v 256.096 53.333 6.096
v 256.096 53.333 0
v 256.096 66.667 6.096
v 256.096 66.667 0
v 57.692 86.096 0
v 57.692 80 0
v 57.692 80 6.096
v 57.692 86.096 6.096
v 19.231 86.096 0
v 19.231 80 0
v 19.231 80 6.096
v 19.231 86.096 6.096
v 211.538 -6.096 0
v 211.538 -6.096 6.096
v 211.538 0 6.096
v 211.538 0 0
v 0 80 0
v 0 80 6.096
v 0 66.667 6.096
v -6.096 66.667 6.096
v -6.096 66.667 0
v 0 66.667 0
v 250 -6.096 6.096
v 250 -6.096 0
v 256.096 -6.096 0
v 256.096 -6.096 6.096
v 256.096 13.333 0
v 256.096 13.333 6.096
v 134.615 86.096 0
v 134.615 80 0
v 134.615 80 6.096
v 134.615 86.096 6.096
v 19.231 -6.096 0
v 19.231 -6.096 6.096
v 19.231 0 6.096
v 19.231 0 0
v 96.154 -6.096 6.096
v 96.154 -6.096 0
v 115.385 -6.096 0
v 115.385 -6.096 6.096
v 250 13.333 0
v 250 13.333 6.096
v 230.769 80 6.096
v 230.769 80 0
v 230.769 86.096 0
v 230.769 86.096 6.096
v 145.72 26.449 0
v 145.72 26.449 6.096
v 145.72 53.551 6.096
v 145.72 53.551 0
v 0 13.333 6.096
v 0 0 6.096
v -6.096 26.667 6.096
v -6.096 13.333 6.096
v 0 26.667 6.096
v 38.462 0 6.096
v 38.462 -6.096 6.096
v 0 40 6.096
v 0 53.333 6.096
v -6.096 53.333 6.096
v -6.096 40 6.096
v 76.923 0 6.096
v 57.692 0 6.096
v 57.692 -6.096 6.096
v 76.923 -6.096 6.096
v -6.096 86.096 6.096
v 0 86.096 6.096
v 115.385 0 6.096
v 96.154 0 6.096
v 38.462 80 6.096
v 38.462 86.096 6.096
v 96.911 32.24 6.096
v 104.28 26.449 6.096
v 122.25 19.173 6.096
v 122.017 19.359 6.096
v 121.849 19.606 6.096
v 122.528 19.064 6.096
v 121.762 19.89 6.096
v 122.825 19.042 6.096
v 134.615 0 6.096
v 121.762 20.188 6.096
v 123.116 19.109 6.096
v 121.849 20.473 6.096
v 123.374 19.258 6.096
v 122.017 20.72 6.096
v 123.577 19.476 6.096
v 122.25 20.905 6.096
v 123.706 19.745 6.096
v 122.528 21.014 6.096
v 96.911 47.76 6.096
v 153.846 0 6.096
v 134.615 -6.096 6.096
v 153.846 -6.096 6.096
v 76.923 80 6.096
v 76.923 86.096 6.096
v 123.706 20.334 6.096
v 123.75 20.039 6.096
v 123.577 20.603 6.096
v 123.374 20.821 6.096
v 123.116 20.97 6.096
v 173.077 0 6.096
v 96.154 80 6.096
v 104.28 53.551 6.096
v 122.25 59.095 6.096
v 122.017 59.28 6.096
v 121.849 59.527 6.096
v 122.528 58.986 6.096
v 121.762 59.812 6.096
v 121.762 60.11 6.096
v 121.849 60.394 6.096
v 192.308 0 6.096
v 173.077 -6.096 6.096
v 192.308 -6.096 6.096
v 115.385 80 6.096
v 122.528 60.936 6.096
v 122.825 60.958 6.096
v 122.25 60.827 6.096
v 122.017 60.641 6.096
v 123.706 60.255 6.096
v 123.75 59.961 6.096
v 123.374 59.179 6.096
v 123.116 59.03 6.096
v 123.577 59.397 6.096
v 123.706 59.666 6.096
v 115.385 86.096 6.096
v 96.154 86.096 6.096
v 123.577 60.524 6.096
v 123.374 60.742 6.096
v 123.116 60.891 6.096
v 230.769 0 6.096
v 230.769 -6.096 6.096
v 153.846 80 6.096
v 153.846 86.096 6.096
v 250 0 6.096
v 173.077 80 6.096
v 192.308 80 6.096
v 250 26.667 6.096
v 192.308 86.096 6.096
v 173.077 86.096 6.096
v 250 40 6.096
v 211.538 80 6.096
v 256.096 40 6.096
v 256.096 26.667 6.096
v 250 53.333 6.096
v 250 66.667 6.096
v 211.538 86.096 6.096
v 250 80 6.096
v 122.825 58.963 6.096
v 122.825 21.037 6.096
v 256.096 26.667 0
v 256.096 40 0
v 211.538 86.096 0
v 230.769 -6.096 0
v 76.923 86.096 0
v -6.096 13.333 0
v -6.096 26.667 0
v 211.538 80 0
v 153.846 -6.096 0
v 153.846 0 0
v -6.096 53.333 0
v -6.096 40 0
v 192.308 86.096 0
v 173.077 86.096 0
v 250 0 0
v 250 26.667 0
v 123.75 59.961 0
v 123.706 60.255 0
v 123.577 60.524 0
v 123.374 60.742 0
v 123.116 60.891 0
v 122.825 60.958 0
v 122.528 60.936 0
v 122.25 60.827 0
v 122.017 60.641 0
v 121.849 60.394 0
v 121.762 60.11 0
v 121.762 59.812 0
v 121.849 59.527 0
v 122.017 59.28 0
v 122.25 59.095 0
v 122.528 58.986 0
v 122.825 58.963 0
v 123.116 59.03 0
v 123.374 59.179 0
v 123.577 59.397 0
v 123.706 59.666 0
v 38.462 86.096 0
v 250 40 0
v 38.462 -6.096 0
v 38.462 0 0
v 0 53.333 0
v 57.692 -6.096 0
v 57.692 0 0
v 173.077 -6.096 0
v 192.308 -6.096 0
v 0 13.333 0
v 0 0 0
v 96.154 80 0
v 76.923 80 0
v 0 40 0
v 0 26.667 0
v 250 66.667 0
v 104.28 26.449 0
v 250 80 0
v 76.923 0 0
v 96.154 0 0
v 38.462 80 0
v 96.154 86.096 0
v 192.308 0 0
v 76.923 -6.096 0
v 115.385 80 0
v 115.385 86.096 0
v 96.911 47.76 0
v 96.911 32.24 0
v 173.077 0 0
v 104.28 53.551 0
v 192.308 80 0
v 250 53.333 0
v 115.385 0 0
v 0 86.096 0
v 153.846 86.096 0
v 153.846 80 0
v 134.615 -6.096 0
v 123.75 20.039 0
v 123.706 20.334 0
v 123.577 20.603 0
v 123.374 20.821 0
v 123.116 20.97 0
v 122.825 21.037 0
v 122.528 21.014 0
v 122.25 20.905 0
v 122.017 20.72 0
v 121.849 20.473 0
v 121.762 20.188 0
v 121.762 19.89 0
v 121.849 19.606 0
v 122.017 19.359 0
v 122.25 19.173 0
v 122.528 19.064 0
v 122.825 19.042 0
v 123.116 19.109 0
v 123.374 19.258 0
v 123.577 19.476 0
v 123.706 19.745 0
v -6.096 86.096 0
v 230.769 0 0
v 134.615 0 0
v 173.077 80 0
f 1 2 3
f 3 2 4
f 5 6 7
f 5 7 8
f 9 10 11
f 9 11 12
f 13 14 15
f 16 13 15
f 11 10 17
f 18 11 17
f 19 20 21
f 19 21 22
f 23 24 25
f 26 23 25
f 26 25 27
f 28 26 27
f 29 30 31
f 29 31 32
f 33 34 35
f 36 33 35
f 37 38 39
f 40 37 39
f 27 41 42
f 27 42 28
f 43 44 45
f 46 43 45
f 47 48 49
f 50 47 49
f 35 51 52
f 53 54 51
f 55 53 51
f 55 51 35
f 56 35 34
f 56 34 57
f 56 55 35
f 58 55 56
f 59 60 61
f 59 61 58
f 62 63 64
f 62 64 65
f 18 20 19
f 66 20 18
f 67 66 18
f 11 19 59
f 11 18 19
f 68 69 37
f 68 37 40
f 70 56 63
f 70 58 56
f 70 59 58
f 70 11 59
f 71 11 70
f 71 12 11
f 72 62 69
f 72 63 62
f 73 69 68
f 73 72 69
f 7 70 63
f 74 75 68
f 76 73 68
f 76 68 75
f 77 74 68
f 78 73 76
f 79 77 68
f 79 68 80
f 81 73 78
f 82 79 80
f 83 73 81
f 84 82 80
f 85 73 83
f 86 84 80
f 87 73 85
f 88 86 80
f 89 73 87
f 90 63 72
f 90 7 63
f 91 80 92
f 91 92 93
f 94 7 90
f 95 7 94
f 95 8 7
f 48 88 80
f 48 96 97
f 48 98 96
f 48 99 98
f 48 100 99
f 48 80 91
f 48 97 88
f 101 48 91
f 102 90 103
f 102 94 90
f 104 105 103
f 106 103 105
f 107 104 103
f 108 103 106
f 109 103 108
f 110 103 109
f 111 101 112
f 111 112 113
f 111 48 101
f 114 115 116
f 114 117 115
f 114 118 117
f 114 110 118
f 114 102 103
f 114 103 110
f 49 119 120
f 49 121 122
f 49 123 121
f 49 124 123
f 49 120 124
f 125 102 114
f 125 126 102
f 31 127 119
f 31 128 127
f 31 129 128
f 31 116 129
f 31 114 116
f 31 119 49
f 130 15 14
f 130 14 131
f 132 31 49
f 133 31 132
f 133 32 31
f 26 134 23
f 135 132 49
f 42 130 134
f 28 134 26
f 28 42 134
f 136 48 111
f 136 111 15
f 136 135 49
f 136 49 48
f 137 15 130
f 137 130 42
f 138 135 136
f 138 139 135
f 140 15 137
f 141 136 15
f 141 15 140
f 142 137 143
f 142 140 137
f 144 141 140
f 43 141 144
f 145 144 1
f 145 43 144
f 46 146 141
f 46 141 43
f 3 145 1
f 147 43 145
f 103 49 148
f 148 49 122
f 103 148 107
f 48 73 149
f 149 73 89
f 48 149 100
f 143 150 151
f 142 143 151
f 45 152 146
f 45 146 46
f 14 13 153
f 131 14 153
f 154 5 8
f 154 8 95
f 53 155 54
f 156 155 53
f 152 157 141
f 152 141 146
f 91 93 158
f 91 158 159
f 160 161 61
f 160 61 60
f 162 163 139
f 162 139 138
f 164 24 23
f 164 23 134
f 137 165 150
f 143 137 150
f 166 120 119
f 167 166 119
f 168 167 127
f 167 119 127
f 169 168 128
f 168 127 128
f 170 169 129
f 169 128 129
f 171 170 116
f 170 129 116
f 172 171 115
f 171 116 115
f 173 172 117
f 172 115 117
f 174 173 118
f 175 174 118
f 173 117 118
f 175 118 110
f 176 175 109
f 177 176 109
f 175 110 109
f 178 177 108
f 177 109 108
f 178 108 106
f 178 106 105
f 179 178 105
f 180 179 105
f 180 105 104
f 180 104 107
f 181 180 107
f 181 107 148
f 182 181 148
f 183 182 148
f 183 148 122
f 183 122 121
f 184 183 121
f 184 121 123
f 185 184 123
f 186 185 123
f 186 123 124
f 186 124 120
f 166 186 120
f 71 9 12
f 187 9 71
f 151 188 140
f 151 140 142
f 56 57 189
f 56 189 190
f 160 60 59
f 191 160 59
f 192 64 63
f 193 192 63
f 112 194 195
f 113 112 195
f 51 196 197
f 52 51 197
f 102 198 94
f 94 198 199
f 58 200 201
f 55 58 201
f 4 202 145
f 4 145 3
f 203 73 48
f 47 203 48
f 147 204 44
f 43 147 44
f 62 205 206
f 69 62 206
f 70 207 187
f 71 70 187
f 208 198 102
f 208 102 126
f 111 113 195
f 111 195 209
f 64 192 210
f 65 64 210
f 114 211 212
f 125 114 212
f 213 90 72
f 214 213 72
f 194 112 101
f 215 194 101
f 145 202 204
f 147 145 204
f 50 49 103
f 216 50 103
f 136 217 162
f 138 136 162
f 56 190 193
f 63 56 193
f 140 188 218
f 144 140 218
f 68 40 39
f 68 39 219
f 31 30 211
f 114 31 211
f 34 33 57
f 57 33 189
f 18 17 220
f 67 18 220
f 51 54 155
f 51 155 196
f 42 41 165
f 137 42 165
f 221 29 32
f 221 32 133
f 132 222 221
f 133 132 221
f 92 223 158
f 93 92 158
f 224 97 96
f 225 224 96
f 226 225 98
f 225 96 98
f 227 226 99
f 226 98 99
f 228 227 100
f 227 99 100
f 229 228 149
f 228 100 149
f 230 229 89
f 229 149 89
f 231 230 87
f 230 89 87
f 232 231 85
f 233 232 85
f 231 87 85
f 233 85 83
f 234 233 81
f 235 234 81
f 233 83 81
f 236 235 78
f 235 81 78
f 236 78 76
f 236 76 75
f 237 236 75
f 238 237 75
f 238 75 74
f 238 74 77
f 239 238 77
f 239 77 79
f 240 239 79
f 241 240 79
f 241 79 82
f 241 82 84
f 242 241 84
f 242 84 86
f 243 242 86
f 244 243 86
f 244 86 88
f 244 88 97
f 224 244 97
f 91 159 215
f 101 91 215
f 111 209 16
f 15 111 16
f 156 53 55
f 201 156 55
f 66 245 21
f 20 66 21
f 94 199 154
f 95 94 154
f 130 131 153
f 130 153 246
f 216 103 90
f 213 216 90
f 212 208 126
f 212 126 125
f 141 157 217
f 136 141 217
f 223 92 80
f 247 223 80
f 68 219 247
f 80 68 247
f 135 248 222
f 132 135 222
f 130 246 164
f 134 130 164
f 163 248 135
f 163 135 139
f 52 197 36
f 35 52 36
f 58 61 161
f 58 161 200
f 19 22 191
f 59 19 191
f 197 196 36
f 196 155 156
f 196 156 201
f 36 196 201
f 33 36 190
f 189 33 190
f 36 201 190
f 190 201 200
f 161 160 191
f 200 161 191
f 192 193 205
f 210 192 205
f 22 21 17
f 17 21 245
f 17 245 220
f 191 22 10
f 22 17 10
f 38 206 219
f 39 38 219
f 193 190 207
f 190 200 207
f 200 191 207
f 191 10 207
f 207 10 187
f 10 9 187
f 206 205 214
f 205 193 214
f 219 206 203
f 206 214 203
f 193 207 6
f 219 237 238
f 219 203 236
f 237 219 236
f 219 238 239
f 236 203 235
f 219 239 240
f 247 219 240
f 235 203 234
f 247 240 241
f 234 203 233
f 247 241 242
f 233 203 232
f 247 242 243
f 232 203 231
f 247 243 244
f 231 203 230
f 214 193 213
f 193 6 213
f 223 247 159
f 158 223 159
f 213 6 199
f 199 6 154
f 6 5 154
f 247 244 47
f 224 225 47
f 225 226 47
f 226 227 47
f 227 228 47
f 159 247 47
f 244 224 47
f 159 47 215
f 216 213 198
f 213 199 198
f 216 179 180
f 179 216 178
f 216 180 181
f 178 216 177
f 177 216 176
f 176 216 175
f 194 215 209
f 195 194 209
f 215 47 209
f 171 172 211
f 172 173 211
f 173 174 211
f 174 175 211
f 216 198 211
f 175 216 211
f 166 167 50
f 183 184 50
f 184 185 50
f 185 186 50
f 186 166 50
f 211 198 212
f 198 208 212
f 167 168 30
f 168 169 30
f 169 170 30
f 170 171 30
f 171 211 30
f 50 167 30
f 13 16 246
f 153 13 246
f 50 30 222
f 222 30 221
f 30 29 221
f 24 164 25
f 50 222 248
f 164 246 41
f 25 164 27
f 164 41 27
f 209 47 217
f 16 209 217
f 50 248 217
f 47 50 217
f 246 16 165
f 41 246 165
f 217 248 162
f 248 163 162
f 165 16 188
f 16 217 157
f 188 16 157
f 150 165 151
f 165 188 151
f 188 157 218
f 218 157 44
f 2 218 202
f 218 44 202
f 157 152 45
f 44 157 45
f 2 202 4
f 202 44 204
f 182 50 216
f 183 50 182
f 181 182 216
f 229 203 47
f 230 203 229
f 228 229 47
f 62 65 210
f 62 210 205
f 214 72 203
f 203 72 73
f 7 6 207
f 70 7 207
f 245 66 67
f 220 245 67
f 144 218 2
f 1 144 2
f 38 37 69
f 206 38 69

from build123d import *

# Parameters (mm, degrees)
SKETCH1_W           = 19.230769231
SKETCH1_H           = 6.096
SKETCH1_W_2         = 6.096
SKETCH1_H_2         = 13.333333333
SKETCH1_H_3         = 13.333333334
BOSS_EXTRUDE1_DEPTH = 6.096
SKETCH2_R           = 1
CUT_EXTRUDE1_DEPTH  = 271.249595093


with BuildPart() as part:
    # Sketch1 → Boss-Extrude1 (new body)
    with BuildSketch(Plane.XY):
        Polygon((76.923076923, 80), (57.692307692, 80), (38.461538462, 80), (19.230769231, 80), (0, 80), (0, 66.666666667), (0, 53.333333333), (0, 40), (0, 26.666666667), (0, 13.333333333), (0, 0), (19.230769231, 0), (38.461538462, 0), (57.692307692, 0), (76.923076923, 0), (96.153846154, 0), (115.384615385, 0), (134.615384615, 0), (153.846153846, 0), (173.076923077, 0), (192.307692308, 0), (211.538461538, 0), (230.769230769, 0), (250, 0), (250, 13.333333333), (250, 26.666666667), (250, 40), (250, 53.333333333), (250, 66.666666667), (250, 80), (230.769230769, 80), (211.538461538, 80), (192.307692308, 80), (173.076923077, 80), (153.846153846, 80), (134.615384615, 80), (115.384615385, 80), (96.153846154, 80), align=None)
        with Locations((28.846153847, 83.048)):
            Rectangle(SKETCH1_W, SKETCH1_H)
        with Locations((-3.048, 73.333333334)):
            Rectangle(SKETCH1_W_2, SKETCH1_H_2)
        with Locations((-3.048, 83.048)):
            Rectangle(SKETCH1_W_2, SKETCH1_H)
        with Locations((-3.048, 46.666666667)):
            Rectangle(SKETCH1_W_2, SKETCH1_H_2)
        with Locations((-3.048, 20)):
            Rectangle(SKETCH1_W_2, SKETCH1_H_3)
        with Locations((28.846153847, -3.048)):
            Rectangle(SKETCH1_W, SKETCH1_H)
        with Locations((67.307692308, -3.048)):
            Rectangle(SKETCH1_W, SKETCH1_H)
        with Locations((105.76923077, -3.048)):
            Rectangle(SKETCH1_W, SKETCH1_H)
        with Locations((144.230769231, -3.048)):
            Rectangle(SKETCH1_W, SKETCH1_H)
        with Locations((182.692307693, -3.048)):
            Rectangle(SKETCH1_W, SKETCH1_H)
        with Locations((221.153846154, -3.048)):
            Rectangle(SKETCH1_W, SKETCH1_H)
        with Locations((253.048, 6.666666667)):
            Rectangle(SKETCH1_W_2, SKETCH1_H_2)
        with Locations((253.048, -3.048)):
            Rectangle(SKETCH1_W_2, SKETCH1_H)
        with Locations((253.048, 33.333333334)):
            Rectangle(SKETCH1_W_2, SKETCH1_H_2)
        with Locations((253.048, 60)):
            Rectangle(SKETCH1_W_2, SKETCH1_H_3)
        with Locations((221.153846154, 83.048)):
            Rectangle(SKETCH1_W, SKETCH1_H)
        with Locations((182.692307693, 83.048)):
            Rectangle(SKETCH1_W, SKETCH1_H)
        with Locations((144.230769231, 83.048)):
            Rectangle(SKETCH1_W, SKETCH1_H)
        with Locations((105.76923077, 83.048)):
            Rectangle(SKETCH1_W, SKETCH1_H)
        with Locations((67.307692308, 83.048)):
            Rectangle(SKETCH1_W, SKETCH1_H)
    extrude(amount=BOSS_EXTRUDE1_DEPTH)

    # Sketch2 → Cut-Extrude1 (cut, through all)
    with BuildSketch(Plane.XY.offset(6.096)):
        with Locations((122.750419351, 59.96058)):
            Circle(SKETCH2_R)
        with Locations((122.750419351, 20.03942)):
            Circle(SKETCH2_R)
        Polygon((145.720049351, 53.5509), (104.279950649, 53.5509), (96.910579351, 47.7597), (96.910579351, 32.2403), (104.279950649, 26.4491), (145.720049351, 26.4491), align=None)
    extrude(amount=-CUT_EXTRUDE1_DEPTH, mode=Mode.SUBTRACT)


solid = part.part
